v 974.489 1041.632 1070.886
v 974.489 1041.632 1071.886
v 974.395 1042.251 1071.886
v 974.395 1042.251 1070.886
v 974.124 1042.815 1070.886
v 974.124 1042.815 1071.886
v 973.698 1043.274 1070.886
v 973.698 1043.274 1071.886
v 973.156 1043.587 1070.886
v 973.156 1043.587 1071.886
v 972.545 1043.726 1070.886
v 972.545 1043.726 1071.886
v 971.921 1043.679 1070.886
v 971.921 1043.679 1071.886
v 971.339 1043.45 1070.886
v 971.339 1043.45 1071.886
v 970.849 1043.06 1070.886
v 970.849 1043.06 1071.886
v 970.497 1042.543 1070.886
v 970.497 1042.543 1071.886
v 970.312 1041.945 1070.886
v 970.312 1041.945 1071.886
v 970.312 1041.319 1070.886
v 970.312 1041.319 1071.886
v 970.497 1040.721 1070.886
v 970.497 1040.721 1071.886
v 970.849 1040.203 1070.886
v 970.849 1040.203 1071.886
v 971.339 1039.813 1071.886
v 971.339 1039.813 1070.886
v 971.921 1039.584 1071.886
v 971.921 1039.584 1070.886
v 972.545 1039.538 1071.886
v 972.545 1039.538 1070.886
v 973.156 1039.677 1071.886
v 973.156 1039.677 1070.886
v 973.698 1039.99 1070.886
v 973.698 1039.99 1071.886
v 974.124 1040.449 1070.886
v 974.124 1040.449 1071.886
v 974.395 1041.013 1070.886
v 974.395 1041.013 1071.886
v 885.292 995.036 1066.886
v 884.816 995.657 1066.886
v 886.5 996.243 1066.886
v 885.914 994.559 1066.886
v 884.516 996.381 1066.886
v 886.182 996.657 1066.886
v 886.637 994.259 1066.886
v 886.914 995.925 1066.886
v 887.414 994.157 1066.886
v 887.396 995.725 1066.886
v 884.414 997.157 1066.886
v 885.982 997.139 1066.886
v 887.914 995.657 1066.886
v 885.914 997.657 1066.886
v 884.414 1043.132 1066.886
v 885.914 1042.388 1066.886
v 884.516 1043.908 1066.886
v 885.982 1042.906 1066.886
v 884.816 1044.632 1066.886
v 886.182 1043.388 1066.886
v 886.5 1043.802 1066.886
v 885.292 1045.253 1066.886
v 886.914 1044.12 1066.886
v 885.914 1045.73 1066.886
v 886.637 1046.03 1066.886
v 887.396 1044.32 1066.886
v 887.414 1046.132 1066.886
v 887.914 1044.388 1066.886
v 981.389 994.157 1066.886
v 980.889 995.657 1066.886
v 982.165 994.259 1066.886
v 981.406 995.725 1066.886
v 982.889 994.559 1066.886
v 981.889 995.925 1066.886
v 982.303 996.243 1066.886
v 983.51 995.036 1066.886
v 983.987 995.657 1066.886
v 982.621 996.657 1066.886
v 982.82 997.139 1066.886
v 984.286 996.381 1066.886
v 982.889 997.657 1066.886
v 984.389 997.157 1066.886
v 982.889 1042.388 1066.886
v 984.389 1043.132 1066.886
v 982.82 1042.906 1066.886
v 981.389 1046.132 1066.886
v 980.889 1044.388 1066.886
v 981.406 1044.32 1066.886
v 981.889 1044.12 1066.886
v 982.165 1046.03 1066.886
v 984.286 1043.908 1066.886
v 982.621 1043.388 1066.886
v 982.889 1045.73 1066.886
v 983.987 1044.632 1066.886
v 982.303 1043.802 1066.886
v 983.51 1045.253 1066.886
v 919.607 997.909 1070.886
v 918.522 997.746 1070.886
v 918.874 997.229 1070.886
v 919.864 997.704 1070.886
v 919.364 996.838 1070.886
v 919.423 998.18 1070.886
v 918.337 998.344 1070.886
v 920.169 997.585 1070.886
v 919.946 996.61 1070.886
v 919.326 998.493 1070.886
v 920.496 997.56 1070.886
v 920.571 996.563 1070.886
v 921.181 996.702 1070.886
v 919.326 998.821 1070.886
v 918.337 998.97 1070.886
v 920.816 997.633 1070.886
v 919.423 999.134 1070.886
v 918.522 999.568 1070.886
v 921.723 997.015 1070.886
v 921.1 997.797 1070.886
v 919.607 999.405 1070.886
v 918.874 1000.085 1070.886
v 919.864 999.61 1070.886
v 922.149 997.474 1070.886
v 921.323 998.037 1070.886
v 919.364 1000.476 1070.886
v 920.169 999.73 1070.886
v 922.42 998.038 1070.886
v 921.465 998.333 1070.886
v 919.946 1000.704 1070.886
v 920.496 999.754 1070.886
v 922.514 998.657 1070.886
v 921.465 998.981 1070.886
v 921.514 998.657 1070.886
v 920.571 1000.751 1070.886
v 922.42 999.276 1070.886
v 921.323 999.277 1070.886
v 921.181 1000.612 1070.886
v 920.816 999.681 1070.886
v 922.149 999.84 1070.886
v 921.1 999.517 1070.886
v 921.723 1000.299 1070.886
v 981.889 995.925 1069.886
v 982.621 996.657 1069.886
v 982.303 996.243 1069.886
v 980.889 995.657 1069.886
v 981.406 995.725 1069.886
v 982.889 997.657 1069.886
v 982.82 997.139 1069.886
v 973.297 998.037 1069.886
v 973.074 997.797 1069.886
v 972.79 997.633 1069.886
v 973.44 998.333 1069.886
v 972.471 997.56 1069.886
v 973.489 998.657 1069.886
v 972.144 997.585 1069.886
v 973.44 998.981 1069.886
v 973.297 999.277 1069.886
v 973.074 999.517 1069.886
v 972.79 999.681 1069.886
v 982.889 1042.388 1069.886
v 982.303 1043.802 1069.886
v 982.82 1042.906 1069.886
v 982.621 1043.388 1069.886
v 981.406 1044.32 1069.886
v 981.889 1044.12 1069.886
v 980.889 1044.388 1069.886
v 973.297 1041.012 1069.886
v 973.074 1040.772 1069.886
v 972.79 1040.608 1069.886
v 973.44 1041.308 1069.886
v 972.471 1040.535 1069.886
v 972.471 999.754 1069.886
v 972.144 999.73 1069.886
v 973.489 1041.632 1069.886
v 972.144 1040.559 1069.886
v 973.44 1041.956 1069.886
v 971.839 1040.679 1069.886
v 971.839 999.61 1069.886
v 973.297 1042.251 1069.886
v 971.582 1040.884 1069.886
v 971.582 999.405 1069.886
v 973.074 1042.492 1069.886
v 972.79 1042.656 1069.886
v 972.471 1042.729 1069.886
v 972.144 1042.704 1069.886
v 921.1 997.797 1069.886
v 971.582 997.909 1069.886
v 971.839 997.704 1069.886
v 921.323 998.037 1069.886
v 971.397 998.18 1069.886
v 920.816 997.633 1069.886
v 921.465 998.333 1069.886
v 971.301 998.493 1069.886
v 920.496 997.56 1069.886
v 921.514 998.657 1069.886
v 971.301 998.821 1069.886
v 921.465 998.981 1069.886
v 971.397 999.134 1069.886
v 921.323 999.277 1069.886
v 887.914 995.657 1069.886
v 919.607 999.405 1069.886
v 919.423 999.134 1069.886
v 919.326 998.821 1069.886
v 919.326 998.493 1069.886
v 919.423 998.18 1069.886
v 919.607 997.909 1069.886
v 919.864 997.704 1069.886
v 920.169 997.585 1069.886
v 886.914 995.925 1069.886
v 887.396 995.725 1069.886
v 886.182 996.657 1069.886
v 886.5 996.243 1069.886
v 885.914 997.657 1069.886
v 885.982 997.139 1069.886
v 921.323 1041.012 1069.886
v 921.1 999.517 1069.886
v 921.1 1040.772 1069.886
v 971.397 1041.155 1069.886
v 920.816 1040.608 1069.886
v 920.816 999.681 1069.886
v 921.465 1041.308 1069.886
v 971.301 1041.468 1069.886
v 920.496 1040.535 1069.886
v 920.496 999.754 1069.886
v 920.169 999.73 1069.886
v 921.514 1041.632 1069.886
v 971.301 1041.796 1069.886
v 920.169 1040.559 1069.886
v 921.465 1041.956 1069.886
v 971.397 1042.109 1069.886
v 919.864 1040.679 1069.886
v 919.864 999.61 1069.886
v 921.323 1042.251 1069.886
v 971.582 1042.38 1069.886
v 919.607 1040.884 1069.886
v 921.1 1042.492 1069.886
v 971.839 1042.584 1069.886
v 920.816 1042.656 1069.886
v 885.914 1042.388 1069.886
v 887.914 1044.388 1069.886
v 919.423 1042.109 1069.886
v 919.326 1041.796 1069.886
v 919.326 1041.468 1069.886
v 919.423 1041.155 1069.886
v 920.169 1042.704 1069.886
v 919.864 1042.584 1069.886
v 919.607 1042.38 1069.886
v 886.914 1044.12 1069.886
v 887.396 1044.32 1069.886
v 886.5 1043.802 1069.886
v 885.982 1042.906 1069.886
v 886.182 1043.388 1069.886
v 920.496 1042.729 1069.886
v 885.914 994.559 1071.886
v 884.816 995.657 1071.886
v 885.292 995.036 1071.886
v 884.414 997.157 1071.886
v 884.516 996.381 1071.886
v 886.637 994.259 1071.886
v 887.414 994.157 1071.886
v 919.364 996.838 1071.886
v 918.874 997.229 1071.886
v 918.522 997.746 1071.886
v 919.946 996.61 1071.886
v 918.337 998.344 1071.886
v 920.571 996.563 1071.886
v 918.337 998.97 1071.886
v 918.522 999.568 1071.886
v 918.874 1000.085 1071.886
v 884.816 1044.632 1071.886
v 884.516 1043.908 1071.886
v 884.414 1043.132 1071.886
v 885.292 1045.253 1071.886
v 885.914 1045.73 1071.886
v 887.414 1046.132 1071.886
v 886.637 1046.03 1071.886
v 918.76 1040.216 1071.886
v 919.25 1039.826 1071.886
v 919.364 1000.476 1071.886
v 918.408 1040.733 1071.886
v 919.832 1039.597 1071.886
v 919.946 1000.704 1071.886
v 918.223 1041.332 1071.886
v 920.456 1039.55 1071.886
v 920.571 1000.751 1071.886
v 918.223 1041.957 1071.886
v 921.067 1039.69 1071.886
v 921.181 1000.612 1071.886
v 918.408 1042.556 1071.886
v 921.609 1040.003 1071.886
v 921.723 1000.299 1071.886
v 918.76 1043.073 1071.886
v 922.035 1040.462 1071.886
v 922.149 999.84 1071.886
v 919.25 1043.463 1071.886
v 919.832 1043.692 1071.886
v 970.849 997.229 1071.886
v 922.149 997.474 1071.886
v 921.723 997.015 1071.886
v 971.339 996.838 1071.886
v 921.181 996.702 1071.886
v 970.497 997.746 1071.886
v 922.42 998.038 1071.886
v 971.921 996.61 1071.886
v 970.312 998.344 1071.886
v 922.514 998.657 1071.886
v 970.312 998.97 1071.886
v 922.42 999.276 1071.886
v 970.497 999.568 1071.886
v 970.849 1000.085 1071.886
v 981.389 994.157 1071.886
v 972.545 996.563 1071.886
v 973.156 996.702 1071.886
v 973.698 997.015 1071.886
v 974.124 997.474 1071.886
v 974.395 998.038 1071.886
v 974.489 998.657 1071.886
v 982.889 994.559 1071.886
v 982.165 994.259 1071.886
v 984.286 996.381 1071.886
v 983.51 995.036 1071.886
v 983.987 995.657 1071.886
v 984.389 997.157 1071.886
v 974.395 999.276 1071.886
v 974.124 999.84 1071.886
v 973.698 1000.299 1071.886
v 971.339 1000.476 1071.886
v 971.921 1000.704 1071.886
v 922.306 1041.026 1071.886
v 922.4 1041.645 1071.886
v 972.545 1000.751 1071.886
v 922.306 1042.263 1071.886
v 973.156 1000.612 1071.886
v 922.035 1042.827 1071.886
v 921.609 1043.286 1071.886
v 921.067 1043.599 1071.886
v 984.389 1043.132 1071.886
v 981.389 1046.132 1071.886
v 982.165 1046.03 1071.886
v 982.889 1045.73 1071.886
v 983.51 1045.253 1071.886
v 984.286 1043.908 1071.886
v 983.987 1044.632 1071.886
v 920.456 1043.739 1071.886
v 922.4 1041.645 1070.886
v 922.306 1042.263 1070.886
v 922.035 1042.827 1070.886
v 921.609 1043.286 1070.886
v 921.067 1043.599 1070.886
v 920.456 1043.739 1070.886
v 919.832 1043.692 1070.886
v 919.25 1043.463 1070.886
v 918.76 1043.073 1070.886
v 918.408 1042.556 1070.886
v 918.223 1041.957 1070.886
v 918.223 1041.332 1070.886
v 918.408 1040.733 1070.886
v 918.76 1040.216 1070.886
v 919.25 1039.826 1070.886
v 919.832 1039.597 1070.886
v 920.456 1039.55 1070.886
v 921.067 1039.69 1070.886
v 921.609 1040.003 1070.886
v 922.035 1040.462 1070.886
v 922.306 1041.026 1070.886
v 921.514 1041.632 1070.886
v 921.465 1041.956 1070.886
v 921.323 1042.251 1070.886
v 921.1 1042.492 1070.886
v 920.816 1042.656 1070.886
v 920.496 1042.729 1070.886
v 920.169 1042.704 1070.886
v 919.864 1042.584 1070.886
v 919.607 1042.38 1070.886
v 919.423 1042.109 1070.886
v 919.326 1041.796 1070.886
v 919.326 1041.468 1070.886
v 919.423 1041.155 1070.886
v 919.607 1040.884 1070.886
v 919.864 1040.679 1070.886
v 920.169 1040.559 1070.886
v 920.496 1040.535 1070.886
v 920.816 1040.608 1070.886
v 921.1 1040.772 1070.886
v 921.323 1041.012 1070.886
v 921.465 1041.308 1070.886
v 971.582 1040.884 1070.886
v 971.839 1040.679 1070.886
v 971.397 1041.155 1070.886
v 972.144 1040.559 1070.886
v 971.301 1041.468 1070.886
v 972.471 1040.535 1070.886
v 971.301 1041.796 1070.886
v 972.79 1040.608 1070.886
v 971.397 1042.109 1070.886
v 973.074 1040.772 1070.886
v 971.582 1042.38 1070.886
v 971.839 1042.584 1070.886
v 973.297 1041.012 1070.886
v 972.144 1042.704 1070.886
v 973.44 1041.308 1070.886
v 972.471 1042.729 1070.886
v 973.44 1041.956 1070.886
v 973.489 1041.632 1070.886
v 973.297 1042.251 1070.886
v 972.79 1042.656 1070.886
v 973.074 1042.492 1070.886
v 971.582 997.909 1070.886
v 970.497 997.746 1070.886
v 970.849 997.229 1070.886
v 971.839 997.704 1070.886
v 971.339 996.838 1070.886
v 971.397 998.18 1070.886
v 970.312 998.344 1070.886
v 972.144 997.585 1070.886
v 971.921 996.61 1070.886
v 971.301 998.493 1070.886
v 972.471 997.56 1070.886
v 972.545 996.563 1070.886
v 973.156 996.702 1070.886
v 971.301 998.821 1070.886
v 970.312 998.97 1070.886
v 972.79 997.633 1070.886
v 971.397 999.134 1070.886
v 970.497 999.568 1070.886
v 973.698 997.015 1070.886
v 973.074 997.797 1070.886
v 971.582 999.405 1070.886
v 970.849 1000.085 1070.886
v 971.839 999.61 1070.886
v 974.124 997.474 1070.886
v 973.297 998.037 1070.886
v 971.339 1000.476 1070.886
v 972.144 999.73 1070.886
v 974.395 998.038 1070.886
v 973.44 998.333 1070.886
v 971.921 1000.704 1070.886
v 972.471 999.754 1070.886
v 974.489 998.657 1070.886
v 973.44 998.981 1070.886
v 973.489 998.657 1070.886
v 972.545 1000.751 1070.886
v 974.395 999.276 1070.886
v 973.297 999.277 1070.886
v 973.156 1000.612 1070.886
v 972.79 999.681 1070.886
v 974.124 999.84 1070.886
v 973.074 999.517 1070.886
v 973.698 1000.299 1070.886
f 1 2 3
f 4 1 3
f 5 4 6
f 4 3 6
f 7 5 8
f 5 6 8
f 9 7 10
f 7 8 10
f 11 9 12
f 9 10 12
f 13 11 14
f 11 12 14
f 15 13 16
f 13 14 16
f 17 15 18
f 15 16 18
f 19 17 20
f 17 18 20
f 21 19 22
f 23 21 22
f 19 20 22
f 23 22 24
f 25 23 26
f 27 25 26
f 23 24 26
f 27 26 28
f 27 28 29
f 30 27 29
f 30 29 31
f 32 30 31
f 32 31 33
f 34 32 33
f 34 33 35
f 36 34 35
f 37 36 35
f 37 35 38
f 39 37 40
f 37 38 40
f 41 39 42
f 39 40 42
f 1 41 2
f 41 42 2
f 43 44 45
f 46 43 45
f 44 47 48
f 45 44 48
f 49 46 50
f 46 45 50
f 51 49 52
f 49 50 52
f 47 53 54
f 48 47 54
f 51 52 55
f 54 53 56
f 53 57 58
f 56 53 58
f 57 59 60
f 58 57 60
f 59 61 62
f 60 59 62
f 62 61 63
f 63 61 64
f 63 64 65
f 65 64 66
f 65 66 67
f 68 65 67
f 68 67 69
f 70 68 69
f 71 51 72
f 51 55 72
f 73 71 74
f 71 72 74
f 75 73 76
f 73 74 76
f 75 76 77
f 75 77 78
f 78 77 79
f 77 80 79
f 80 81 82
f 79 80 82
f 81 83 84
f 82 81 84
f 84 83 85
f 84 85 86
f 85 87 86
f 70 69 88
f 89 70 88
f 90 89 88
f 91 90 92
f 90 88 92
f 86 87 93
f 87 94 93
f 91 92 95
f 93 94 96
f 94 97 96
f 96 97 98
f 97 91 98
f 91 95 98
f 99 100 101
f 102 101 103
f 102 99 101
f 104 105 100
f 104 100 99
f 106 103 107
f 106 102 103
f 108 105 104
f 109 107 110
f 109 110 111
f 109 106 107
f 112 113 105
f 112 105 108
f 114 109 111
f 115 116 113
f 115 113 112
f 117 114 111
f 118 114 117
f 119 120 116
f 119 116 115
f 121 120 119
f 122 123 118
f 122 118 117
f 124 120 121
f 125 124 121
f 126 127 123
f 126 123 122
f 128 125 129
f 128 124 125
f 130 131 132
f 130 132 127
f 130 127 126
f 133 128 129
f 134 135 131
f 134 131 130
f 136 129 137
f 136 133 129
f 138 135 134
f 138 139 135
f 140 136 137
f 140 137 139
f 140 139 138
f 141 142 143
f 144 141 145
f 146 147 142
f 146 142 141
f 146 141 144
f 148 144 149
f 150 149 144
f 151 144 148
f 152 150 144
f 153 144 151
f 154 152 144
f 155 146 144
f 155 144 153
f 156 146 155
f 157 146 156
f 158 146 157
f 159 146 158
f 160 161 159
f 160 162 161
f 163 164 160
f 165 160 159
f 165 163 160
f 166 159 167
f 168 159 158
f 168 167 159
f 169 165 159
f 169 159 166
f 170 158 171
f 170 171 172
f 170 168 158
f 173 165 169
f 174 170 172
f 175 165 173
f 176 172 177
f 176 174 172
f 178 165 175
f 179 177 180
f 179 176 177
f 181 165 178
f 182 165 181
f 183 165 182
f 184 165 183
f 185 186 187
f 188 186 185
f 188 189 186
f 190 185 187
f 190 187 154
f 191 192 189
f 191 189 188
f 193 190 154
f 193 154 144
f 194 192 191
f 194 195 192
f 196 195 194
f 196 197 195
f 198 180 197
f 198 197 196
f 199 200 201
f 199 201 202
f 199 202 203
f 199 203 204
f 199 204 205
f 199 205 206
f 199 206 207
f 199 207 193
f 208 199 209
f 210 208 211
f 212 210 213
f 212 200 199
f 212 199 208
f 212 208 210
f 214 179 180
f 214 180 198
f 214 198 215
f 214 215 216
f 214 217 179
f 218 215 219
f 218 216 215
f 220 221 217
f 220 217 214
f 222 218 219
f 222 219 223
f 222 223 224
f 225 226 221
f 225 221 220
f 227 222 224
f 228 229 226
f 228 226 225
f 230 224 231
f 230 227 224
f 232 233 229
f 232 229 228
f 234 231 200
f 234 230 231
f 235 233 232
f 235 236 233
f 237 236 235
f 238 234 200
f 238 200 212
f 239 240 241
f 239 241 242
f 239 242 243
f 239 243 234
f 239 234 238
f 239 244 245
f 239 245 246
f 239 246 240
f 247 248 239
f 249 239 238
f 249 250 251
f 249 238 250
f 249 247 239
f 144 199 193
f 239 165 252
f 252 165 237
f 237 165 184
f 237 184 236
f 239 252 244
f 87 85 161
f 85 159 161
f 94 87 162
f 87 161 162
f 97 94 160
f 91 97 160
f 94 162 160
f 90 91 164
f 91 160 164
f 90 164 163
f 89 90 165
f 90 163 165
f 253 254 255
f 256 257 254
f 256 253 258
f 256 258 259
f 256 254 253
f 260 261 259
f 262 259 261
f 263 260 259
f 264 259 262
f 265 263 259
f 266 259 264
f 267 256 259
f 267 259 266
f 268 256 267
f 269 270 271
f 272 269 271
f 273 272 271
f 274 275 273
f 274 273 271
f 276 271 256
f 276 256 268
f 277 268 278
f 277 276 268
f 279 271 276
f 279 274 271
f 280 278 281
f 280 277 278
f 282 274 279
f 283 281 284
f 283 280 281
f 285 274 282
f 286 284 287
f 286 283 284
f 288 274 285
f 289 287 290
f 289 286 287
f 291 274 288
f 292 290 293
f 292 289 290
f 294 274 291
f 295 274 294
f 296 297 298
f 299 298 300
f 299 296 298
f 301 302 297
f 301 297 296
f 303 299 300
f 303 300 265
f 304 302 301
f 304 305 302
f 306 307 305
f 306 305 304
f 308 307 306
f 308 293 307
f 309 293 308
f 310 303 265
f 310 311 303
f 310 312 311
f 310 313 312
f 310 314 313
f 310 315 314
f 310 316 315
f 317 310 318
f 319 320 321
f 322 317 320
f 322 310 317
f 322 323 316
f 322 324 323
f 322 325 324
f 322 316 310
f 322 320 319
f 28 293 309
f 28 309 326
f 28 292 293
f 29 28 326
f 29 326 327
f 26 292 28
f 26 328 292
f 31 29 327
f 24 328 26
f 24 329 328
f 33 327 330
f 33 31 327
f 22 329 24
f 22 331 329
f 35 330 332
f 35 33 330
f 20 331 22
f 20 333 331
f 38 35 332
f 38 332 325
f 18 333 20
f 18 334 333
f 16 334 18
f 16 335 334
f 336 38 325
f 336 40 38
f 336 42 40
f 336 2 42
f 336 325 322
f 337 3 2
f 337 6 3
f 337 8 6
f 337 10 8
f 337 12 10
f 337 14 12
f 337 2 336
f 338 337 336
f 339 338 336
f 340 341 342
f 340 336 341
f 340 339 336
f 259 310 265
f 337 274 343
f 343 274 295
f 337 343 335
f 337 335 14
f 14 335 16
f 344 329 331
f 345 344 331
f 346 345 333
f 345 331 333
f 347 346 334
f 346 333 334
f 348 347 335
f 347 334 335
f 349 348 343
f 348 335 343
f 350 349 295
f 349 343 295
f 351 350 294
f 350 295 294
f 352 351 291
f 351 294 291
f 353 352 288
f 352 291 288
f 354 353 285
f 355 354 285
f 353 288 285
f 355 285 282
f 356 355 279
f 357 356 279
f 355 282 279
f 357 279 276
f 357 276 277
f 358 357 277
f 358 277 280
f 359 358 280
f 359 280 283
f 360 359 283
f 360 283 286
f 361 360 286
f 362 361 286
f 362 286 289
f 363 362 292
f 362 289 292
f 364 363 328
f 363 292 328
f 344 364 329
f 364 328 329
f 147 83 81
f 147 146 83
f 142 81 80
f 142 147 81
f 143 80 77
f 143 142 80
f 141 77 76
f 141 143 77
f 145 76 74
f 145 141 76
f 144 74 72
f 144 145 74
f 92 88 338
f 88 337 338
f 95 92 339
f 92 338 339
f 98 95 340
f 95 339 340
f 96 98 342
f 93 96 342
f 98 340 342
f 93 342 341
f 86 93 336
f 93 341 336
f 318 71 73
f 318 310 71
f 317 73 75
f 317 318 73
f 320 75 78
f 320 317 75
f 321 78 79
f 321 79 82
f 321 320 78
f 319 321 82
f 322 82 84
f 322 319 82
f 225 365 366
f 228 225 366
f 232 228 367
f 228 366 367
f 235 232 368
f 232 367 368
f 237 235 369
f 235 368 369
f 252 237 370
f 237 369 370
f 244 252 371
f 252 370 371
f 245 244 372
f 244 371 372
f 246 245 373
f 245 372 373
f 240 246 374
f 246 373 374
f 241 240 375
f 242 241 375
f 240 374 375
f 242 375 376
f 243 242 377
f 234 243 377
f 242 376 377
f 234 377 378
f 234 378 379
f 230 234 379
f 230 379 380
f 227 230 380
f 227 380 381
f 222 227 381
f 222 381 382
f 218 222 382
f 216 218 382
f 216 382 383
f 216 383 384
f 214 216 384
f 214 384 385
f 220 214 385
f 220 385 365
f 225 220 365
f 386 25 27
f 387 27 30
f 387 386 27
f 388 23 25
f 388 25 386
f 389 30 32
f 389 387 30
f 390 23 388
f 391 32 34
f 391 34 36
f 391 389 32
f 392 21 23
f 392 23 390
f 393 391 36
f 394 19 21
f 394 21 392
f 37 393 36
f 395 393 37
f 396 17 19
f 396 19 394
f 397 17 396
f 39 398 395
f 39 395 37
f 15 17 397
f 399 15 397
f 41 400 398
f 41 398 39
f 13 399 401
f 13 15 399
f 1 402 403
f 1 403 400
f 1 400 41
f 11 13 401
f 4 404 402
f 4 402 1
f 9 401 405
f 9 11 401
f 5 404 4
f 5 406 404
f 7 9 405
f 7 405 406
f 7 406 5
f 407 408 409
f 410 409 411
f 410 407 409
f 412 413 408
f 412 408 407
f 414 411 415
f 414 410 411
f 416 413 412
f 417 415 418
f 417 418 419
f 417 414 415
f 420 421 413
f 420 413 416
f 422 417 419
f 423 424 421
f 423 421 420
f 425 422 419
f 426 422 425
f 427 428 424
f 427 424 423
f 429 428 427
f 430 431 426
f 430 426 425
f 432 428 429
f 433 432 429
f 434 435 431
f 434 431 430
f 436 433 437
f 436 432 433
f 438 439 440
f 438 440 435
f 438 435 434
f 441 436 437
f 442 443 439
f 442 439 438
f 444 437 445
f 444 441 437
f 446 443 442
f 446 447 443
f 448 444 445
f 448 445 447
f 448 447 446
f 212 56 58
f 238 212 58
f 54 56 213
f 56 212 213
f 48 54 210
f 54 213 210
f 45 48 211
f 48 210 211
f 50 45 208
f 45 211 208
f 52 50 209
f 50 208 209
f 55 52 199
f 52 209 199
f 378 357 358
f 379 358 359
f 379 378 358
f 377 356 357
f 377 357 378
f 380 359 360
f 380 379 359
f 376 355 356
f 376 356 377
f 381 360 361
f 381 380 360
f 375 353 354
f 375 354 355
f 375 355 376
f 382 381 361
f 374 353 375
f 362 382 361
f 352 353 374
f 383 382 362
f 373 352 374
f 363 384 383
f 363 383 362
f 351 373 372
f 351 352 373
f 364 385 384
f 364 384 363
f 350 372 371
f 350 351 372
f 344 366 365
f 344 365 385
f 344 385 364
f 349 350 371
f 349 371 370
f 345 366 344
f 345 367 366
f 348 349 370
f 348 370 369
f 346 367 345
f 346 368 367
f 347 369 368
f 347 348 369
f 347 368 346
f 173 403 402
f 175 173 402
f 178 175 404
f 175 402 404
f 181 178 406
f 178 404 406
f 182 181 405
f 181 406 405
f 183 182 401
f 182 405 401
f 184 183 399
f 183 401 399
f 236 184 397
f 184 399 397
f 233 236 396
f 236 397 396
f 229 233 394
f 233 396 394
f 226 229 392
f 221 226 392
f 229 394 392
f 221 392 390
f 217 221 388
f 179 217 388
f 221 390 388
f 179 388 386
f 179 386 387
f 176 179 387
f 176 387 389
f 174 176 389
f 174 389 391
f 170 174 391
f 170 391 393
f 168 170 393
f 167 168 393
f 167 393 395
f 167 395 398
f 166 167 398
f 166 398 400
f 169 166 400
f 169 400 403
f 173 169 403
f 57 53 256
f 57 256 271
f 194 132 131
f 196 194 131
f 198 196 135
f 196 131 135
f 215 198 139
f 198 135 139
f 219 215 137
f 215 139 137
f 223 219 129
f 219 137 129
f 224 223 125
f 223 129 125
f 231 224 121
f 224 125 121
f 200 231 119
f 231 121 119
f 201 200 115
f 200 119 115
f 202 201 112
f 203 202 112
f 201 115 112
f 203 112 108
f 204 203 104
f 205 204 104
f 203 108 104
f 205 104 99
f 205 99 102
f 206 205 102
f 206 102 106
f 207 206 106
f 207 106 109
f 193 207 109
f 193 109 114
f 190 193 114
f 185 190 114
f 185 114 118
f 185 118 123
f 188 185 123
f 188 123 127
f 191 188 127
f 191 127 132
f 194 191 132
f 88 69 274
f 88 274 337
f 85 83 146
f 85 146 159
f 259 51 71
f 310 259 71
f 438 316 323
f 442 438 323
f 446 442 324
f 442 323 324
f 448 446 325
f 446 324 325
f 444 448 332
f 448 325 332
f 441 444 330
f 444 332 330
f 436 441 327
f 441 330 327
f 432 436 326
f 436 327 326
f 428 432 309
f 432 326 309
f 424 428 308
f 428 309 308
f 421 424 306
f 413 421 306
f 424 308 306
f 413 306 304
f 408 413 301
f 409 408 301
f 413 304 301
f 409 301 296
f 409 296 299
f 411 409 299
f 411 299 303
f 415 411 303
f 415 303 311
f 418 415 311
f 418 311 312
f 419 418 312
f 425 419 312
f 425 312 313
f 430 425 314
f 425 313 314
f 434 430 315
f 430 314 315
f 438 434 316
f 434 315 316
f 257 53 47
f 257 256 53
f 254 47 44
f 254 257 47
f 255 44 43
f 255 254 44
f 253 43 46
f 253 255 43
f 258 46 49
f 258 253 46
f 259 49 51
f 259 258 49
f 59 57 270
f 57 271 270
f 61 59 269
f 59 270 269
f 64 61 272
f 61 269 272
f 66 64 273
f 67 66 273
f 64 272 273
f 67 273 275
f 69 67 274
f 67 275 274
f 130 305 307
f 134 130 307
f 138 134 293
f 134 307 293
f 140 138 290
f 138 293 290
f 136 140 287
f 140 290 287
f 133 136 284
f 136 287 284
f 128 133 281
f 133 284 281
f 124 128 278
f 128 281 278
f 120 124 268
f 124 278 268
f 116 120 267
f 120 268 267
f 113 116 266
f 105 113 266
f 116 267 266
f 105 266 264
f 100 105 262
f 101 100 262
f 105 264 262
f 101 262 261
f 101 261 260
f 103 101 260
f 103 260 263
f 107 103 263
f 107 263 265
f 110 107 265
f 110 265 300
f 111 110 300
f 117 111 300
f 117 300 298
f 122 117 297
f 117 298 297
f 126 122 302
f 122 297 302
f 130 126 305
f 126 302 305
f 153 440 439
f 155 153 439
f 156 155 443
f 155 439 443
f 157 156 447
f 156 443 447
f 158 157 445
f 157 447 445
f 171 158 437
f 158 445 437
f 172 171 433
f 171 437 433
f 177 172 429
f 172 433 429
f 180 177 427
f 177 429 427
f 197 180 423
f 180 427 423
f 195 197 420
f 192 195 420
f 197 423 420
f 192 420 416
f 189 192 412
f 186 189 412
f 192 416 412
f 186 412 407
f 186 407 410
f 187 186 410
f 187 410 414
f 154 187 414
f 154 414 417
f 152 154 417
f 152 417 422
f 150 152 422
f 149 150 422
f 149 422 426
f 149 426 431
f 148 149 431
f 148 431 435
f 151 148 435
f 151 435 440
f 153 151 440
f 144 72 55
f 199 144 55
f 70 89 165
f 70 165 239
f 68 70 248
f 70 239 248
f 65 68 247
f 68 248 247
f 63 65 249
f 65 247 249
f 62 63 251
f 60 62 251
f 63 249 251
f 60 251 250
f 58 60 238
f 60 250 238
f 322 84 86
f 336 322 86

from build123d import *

# Parameters (mm, degrees)
SKETCH_1_W          = 99.97480061
SKETCH_1_H          = 51.97470409
EXTRUDE_1_DEPTH     = 5
SKETCH_2_W          = 96.97480061
SKETCH_2_H          = 48.730863602
CUT_EXTRUDE_1_DEPTH = 3
SKETCH_3_R          = 1.1
CUT_EXTRUDE_2_DEPTH = 1437.467063218
FILLET_1_R          = 3
FILLET_2_R          = 2
SKETCH_4_R          = 2.1
CUT_EXTRUDE_3_DEPTH = 1


with BuildPart() as part:
    # 草图1 → 凸台-拉伸1 (new body)
    with BuildSketch(Plane.XY.offset(1066.885602923)):
        with Locations((934.401162421, 1020.144466268)):
            Rectangle(SKETCH_1_W, SKETCH_1_H)
    extrude(amount=EXTRUDE_1_DEPTH)

    # 草图2 → 切除-拉伸1 (cut)
    with BuildSketch(Plane(origin=(0, 0, 1066.885602923), x_dir=(-1, 0, 0), z_dir=(0, 0, -1))):
        with Locations((-934.401162421, 1020.022546024)):
            Rectangle(SKETCH_2_W, SKETCH_2_H)
    extrude(amount=-CUT_EXTRUDE_1_DEPTH, mode=Mode.SUBTRACT)

    # 草图3 → 切除-拉伸2 (cut, through all)
    with BuildSketch(Plane.XY.offset(1071.885602923)):
        with Locations((972.388562726, 1041.631818313)):
            Circle(SKETCH_3_R)
        with Locations((972.388562726, 998.657114223)):
            Circle(SKETCH_3_R)
        with Locations((920.413762116, 998.657114223)):
            Circle(SKETCH_3_R)
        with Locations((920.413762116, 1041.631818313)):
            Circle(SKETCH_3_R)
    extrude(amount=-CUT_EXTRUDE_2_DEPTH, mode=Mode.SUBTRACT)

    # 圆角1
    fillet_1_edges = [part.edges().sort_by_distance(p)[0] for p in [
        (884.413762116, 1046.131818313, 1069.385602923),
        (984.388562726, 1046.131818313, 1069.385602923),
        (984.388562726, 994.157114223, 1069.385602923),
        (884.413762116, 994.157114223, 1069.385602923),
    ]]
    fillet(fillet_1_edges, radius=FILLET_1_R)

    # 圆角2
    fillet_2_edges = [part.edges().sort_by_distance(p)[0] for p in [
        (982.888562726, 995.657114223, 1068.385602923),
        (982.888562726, 1044.387977825, 1068.385602923),
        (885.913762116, 1044.387977825, 1068.385602923),
        (885.913762116, 995.657114223, 1068.385602923),
    ]]
    fillet(fillet_2_edges, radius=FILLET_2_R)

    # 草图4 → 切除-拉伸3 (cut)
    with BuildSketch(Plane.XY.offset(1071.885602923)):
        with Locations((920.299535548, 1041.644508178)):
            Circle(SKETCH_4_R)
        with Locations((972.388562726, 1041.631818313)):
            Circle(SKETCH_4_R)
        with Locations((972.388562726, 998.657114223)):
            Circle(SKETCH_4_R)
        with Locations((920.413762116, 998.657114223)):
            Circle(SKETCH_4_R)
    extrude(amount=-CUT_EXTRUDE_3_DEPTH, mode=Mode.SUBTRACT)


solid = part.part
